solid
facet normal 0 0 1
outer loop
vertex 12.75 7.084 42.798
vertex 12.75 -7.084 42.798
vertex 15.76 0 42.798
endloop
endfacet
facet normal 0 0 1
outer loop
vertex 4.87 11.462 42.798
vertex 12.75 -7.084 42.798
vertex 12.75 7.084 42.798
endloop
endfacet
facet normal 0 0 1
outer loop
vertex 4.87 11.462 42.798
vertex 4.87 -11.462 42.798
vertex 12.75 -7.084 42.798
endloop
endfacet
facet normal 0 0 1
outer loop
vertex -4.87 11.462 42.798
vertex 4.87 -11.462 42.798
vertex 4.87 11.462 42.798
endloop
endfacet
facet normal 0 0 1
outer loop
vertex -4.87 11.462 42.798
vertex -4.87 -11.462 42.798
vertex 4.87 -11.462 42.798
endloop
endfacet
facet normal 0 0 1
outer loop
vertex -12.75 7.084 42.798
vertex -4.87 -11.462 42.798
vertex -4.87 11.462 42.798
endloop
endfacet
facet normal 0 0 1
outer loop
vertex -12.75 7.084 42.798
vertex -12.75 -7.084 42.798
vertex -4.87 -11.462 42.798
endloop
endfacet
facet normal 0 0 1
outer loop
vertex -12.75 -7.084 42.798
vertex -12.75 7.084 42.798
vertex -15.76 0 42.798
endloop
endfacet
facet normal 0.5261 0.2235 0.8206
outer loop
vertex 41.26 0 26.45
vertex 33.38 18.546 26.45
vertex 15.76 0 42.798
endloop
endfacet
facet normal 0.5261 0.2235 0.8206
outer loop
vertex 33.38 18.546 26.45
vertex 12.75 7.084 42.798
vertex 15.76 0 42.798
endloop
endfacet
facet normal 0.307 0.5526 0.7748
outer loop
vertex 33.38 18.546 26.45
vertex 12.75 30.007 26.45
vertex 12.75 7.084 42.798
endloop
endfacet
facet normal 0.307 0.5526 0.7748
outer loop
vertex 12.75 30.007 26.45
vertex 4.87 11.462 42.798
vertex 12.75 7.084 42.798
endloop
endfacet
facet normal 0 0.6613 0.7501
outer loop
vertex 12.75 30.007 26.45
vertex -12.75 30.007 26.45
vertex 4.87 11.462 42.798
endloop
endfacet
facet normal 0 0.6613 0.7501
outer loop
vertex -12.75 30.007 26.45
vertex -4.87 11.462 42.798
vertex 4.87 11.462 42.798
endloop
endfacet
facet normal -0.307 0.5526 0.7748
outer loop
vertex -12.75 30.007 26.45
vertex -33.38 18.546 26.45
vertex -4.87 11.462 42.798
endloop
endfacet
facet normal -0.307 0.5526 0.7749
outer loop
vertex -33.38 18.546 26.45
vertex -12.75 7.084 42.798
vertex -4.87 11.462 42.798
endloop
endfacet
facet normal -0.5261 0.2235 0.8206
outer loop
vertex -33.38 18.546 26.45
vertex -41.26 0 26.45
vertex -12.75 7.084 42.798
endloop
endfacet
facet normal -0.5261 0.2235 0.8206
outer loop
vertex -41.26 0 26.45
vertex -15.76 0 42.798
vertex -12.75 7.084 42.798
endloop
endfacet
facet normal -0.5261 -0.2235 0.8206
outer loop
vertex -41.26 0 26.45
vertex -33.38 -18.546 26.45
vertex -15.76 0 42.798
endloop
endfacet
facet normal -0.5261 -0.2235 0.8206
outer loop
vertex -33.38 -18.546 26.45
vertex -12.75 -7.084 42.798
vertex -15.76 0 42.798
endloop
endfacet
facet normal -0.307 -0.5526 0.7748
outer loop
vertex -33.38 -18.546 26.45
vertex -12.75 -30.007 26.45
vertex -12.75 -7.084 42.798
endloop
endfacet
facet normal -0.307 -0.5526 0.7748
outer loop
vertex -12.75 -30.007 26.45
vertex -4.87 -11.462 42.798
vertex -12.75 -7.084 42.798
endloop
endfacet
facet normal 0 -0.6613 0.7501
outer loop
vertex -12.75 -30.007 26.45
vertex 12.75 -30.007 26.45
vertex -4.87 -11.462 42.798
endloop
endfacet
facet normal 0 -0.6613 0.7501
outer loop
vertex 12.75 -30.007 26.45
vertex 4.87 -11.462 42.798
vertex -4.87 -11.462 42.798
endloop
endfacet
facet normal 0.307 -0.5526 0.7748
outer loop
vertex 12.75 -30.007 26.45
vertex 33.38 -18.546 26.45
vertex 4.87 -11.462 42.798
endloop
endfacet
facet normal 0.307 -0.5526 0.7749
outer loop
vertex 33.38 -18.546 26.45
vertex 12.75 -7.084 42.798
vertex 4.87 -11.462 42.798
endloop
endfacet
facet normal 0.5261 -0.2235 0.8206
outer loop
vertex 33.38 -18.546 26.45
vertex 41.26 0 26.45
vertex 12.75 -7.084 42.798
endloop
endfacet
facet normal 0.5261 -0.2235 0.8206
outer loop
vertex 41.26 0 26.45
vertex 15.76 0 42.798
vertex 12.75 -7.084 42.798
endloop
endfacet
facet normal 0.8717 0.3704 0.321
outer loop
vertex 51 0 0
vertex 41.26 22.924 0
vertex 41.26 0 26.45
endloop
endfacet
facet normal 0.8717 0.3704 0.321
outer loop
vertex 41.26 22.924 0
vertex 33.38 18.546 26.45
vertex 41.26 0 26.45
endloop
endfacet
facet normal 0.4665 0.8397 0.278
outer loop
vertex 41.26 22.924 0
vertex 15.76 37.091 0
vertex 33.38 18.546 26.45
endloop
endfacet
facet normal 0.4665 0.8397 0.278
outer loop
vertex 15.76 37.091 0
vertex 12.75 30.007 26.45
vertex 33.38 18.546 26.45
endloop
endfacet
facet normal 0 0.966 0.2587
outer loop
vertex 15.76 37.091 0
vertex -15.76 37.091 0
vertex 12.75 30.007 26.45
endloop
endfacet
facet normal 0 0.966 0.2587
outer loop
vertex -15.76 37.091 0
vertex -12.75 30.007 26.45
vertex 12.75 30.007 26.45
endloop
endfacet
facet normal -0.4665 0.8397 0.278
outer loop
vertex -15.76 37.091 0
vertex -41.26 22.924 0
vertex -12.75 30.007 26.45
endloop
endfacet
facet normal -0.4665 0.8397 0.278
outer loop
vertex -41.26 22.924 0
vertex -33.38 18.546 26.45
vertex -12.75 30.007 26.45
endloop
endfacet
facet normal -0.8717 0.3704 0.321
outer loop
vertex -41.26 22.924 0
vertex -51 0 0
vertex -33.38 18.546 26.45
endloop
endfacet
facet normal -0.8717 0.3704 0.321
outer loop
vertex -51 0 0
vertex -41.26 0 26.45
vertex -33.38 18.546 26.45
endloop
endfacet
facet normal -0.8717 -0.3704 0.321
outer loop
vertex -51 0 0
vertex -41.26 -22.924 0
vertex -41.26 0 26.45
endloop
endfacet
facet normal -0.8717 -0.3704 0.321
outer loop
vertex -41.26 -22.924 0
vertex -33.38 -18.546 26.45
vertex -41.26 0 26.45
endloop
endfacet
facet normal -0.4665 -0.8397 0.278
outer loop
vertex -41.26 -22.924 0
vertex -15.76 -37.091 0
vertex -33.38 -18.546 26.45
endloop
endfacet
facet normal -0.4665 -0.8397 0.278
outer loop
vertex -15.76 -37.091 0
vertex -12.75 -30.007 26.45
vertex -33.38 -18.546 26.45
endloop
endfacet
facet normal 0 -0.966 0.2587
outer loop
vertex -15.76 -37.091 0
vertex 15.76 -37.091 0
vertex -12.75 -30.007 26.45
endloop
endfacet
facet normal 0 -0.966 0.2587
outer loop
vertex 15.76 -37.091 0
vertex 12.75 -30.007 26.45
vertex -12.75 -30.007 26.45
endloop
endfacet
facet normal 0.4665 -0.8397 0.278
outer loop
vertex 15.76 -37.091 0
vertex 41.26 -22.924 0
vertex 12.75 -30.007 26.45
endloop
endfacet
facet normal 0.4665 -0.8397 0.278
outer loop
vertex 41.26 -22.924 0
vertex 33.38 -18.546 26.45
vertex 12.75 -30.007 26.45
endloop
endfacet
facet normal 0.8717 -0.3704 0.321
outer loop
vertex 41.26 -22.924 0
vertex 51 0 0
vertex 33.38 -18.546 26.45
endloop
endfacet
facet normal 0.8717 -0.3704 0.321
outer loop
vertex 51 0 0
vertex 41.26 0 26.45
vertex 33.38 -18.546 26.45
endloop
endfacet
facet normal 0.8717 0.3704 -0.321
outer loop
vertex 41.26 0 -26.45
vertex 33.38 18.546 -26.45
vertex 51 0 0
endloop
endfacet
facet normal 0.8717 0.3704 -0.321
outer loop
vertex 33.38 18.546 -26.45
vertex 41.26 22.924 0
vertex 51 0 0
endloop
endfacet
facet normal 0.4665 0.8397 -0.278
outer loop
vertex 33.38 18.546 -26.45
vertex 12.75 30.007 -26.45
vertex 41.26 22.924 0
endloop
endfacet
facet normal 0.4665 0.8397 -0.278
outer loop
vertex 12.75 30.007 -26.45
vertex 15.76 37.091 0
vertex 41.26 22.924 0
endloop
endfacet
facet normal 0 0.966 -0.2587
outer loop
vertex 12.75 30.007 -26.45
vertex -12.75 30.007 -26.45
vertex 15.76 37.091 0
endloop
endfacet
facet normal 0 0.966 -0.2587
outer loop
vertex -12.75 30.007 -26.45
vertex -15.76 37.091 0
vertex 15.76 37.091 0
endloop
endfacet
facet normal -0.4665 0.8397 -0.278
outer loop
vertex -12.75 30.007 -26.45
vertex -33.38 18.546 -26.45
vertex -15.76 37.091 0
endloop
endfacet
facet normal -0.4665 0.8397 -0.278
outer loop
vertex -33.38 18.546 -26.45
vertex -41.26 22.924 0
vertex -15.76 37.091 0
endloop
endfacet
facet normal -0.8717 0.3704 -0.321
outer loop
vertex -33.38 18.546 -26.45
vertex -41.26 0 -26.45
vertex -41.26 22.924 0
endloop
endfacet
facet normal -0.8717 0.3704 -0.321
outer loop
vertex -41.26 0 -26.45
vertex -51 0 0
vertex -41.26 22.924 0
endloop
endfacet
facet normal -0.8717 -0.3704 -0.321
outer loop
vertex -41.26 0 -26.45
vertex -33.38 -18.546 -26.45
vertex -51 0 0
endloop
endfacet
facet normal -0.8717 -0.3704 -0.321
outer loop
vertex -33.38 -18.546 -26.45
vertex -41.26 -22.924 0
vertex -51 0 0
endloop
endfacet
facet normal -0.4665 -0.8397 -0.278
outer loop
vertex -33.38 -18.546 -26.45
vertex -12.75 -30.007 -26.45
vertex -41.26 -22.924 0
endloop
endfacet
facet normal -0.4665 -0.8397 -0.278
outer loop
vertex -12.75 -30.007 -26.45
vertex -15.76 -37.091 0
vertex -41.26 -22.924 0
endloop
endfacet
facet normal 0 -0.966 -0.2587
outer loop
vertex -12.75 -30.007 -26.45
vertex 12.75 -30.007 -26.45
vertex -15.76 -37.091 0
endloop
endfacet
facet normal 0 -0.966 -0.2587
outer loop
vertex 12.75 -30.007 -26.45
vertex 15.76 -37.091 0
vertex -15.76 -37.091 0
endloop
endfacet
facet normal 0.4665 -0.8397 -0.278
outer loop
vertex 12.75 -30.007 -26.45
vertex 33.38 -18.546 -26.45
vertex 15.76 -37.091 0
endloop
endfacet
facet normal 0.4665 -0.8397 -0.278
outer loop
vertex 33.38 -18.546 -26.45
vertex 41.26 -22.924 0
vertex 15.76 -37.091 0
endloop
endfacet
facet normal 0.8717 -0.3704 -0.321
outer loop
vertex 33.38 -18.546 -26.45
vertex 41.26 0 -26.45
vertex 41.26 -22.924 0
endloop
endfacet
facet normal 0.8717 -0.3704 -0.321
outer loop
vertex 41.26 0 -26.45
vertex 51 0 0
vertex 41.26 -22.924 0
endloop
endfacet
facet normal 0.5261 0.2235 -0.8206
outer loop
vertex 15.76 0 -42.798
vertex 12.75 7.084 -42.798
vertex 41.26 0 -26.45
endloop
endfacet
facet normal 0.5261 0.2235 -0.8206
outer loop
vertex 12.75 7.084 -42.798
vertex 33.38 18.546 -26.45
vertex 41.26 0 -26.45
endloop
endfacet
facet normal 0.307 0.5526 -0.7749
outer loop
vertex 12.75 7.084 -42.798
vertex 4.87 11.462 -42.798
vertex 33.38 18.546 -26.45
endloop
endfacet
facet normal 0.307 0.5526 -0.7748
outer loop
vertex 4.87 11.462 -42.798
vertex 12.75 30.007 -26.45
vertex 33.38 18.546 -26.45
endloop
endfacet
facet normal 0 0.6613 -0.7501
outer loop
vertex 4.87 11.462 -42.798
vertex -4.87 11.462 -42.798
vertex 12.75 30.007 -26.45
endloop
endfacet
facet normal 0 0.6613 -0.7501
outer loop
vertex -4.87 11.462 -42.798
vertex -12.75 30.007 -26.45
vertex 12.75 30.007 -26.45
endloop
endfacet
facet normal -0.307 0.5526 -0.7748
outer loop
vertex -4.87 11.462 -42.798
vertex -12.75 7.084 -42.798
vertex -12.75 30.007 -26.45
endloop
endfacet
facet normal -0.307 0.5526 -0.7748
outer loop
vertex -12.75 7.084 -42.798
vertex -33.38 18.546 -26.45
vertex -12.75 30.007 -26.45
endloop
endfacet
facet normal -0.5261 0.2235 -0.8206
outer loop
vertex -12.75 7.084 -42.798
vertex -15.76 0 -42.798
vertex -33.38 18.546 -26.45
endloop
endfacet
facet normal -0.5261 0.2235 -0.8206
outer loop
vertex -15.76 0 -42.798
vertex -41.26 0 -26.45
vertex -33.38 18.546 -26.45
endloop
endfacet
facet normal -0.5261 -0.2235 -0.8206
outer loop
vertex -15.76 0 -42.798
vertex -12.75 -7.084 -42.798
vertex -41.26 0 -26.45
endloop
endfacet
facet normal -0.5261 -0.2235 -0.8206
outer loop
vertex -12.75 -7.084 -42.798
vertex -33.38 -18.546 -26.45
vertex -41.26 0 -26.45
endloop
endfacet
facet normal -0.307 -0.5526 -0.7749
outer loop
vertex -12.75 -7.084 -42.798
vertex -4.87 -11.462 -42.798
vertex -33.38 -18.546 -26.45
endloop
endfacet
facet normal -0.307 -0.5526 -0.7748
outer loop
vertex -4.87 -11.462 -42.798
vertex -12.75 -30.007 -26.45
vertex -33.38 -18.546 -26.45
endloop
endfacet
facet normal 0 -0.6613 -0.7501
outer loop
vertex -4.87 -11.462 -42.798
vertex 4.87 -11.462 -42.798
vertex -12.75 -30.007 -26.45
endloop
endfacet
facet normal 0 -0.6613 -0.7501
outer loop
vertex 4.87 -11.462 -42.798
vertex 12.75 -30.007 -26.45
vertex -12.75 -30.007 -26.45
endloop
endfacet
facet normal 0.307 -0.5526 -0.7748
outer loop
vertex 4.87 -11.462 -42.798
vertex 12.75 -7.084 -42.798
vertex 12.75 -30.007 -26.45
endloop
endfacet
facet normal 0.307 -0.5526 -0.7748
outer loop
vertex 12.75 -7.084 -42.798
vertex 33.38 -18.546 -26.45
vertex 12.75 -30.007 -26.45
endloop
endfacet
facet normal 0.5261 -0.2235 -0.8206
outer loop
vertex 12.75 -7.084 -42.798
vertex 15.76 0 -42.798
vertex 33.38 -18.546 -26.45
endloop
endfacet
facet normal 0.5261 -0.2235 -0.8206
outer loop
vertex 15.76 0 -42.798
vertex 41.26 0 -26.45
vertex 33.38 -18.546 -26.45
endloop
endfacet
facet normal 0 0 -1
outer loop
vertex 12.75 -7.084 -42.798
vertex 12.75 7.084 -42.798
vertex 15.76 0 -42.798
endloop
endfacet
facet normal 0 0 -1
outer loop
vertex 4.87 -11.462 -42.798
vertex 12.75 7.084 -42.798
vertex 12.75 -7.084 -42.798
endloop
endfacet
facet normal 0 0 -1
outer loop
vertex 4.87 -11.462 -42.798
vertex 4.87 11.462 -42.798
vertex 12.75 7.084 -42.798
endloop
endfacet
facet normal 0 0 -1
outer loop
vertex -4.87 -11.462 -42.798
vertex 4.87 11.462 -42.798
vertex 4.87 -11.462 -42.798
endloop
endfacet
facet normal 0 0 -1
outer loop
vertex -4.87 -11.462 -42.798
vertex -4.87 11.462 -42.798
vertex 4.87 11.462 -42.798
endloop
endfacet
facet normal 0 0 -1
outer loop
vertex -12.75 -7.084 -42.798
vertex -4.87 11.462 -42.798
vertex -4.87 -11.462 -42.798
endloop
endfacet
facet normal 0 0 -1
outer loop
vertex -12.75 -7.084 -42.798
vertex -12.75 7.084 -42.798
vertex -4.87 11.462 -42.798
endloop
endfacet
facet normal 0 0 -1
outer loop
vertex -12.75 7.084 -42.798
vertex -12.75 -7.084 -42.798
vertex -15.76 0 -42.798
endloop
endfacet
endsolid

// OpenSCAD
// Generated by SolidPython 1.0.1 on 2020-07-29 00:46:53


scale(v = [17, 13, 15]) {
	sphere(r = 3);
}
/***********************************************
*********      SolidPython code:      **********
************************************************
 
# import packages: SolidPython
from solid import *
from solid.utils import *
from itertools import chain, combinations, permutations


class Resize:

    def __init__(self, scad_file):
        self.scad_file = scad_file
        #self.scad_file = import_scad(scad_file)
        # cone/cylinder param:
        self.r1 = 0
        self.r2 = 0
        self.h = 0
        # rectangular prism param:
        self.w = 0
        self.l = 0
        # ellipse param:
        self.r = 0

    # import OpenScad code (file name corresponds to shape)


    # classify shape + parameters
    def assign(self, param1, param2, param3):
        if self.scad_file == 'cone.scad':
            self.r1 = param1
            self.r2 = param2
            self.h = param3
        elif self.scad_file == 'cylinder.scad':
            self.r1 = param1
            self.r2 = param2
            self.h = param3
        elif self.scad_file == 'rectangularPrism.scad':
            self.h = param1
            self.l = param2
            self.w = param3
        else:
            self.r = param1
            self.h = param2

    # resize parameters
    def iterate(self):
        x = range(3, 20, 2)
        i = 1
        if self.scad_file == 'cone.scad':
            tempList = list(permutations(x, 2))
            for temp in tempList:
                param1 = temp[0]
                param2 = temp[1]
                filepath = 'produced_scad_files/' + 'cone' + str(param1) + '_' + str(param2) + '_' + '.scad'
                scad_render_to_file(cylinder(h=param1, r1=param2, r2=0), filepath)

        elif self.scad_file == 'cylinder.scad':
            tempList = list(permutations(x, 3))
            for temp in tempList:
                param1 = temp[0]
                param2 = temp[1]
                filepath = 'produced_scad_files/' + 'cylinder' + str(param1) + '_' + str(param2) + '_' + '.scad'
                scad_render_to_file(cylinder(h=param1, r1=param2, r2=param2), filepath)

        elif self.scad_file == 'rectangularPrism.scad':
            tempList = list(permutations(x, 3))
            for temp in tempList:
                param1 = temp[0]
                param2 = temp[1]
                param3 = temp[2]
                filepath = 'produced_scad_files/' + 'rectangularPrism' + str(param1) + '_' + str(param2) + '_' + str(
                    param3) + '.scad'
                scad_render_to_file(cube(size=(param1, param2, param3)), filepath)

        elif self.scad_file == 'ellipse.scad':
            tempList = list(permutations(x, 4))
            for temp in tempList:
                param1 = temp[0]
                param2 = temp[1]
                param3 = temp[2]
                param4 = temp[3]
                filepath = 'produced_scad_files/' + 'ellipse' + str(param1) + '_' + str(param2) + '_' + str(param3) + '_' + str(param4) + '.scad'
                scad_render_to_file(scale([param1, param2, param3])(sphere(r=param4)), filepath)

    def render_to_scadfile(self):
        scad_render_to_file(scad, 'example.scad') 
 
************************************************/
